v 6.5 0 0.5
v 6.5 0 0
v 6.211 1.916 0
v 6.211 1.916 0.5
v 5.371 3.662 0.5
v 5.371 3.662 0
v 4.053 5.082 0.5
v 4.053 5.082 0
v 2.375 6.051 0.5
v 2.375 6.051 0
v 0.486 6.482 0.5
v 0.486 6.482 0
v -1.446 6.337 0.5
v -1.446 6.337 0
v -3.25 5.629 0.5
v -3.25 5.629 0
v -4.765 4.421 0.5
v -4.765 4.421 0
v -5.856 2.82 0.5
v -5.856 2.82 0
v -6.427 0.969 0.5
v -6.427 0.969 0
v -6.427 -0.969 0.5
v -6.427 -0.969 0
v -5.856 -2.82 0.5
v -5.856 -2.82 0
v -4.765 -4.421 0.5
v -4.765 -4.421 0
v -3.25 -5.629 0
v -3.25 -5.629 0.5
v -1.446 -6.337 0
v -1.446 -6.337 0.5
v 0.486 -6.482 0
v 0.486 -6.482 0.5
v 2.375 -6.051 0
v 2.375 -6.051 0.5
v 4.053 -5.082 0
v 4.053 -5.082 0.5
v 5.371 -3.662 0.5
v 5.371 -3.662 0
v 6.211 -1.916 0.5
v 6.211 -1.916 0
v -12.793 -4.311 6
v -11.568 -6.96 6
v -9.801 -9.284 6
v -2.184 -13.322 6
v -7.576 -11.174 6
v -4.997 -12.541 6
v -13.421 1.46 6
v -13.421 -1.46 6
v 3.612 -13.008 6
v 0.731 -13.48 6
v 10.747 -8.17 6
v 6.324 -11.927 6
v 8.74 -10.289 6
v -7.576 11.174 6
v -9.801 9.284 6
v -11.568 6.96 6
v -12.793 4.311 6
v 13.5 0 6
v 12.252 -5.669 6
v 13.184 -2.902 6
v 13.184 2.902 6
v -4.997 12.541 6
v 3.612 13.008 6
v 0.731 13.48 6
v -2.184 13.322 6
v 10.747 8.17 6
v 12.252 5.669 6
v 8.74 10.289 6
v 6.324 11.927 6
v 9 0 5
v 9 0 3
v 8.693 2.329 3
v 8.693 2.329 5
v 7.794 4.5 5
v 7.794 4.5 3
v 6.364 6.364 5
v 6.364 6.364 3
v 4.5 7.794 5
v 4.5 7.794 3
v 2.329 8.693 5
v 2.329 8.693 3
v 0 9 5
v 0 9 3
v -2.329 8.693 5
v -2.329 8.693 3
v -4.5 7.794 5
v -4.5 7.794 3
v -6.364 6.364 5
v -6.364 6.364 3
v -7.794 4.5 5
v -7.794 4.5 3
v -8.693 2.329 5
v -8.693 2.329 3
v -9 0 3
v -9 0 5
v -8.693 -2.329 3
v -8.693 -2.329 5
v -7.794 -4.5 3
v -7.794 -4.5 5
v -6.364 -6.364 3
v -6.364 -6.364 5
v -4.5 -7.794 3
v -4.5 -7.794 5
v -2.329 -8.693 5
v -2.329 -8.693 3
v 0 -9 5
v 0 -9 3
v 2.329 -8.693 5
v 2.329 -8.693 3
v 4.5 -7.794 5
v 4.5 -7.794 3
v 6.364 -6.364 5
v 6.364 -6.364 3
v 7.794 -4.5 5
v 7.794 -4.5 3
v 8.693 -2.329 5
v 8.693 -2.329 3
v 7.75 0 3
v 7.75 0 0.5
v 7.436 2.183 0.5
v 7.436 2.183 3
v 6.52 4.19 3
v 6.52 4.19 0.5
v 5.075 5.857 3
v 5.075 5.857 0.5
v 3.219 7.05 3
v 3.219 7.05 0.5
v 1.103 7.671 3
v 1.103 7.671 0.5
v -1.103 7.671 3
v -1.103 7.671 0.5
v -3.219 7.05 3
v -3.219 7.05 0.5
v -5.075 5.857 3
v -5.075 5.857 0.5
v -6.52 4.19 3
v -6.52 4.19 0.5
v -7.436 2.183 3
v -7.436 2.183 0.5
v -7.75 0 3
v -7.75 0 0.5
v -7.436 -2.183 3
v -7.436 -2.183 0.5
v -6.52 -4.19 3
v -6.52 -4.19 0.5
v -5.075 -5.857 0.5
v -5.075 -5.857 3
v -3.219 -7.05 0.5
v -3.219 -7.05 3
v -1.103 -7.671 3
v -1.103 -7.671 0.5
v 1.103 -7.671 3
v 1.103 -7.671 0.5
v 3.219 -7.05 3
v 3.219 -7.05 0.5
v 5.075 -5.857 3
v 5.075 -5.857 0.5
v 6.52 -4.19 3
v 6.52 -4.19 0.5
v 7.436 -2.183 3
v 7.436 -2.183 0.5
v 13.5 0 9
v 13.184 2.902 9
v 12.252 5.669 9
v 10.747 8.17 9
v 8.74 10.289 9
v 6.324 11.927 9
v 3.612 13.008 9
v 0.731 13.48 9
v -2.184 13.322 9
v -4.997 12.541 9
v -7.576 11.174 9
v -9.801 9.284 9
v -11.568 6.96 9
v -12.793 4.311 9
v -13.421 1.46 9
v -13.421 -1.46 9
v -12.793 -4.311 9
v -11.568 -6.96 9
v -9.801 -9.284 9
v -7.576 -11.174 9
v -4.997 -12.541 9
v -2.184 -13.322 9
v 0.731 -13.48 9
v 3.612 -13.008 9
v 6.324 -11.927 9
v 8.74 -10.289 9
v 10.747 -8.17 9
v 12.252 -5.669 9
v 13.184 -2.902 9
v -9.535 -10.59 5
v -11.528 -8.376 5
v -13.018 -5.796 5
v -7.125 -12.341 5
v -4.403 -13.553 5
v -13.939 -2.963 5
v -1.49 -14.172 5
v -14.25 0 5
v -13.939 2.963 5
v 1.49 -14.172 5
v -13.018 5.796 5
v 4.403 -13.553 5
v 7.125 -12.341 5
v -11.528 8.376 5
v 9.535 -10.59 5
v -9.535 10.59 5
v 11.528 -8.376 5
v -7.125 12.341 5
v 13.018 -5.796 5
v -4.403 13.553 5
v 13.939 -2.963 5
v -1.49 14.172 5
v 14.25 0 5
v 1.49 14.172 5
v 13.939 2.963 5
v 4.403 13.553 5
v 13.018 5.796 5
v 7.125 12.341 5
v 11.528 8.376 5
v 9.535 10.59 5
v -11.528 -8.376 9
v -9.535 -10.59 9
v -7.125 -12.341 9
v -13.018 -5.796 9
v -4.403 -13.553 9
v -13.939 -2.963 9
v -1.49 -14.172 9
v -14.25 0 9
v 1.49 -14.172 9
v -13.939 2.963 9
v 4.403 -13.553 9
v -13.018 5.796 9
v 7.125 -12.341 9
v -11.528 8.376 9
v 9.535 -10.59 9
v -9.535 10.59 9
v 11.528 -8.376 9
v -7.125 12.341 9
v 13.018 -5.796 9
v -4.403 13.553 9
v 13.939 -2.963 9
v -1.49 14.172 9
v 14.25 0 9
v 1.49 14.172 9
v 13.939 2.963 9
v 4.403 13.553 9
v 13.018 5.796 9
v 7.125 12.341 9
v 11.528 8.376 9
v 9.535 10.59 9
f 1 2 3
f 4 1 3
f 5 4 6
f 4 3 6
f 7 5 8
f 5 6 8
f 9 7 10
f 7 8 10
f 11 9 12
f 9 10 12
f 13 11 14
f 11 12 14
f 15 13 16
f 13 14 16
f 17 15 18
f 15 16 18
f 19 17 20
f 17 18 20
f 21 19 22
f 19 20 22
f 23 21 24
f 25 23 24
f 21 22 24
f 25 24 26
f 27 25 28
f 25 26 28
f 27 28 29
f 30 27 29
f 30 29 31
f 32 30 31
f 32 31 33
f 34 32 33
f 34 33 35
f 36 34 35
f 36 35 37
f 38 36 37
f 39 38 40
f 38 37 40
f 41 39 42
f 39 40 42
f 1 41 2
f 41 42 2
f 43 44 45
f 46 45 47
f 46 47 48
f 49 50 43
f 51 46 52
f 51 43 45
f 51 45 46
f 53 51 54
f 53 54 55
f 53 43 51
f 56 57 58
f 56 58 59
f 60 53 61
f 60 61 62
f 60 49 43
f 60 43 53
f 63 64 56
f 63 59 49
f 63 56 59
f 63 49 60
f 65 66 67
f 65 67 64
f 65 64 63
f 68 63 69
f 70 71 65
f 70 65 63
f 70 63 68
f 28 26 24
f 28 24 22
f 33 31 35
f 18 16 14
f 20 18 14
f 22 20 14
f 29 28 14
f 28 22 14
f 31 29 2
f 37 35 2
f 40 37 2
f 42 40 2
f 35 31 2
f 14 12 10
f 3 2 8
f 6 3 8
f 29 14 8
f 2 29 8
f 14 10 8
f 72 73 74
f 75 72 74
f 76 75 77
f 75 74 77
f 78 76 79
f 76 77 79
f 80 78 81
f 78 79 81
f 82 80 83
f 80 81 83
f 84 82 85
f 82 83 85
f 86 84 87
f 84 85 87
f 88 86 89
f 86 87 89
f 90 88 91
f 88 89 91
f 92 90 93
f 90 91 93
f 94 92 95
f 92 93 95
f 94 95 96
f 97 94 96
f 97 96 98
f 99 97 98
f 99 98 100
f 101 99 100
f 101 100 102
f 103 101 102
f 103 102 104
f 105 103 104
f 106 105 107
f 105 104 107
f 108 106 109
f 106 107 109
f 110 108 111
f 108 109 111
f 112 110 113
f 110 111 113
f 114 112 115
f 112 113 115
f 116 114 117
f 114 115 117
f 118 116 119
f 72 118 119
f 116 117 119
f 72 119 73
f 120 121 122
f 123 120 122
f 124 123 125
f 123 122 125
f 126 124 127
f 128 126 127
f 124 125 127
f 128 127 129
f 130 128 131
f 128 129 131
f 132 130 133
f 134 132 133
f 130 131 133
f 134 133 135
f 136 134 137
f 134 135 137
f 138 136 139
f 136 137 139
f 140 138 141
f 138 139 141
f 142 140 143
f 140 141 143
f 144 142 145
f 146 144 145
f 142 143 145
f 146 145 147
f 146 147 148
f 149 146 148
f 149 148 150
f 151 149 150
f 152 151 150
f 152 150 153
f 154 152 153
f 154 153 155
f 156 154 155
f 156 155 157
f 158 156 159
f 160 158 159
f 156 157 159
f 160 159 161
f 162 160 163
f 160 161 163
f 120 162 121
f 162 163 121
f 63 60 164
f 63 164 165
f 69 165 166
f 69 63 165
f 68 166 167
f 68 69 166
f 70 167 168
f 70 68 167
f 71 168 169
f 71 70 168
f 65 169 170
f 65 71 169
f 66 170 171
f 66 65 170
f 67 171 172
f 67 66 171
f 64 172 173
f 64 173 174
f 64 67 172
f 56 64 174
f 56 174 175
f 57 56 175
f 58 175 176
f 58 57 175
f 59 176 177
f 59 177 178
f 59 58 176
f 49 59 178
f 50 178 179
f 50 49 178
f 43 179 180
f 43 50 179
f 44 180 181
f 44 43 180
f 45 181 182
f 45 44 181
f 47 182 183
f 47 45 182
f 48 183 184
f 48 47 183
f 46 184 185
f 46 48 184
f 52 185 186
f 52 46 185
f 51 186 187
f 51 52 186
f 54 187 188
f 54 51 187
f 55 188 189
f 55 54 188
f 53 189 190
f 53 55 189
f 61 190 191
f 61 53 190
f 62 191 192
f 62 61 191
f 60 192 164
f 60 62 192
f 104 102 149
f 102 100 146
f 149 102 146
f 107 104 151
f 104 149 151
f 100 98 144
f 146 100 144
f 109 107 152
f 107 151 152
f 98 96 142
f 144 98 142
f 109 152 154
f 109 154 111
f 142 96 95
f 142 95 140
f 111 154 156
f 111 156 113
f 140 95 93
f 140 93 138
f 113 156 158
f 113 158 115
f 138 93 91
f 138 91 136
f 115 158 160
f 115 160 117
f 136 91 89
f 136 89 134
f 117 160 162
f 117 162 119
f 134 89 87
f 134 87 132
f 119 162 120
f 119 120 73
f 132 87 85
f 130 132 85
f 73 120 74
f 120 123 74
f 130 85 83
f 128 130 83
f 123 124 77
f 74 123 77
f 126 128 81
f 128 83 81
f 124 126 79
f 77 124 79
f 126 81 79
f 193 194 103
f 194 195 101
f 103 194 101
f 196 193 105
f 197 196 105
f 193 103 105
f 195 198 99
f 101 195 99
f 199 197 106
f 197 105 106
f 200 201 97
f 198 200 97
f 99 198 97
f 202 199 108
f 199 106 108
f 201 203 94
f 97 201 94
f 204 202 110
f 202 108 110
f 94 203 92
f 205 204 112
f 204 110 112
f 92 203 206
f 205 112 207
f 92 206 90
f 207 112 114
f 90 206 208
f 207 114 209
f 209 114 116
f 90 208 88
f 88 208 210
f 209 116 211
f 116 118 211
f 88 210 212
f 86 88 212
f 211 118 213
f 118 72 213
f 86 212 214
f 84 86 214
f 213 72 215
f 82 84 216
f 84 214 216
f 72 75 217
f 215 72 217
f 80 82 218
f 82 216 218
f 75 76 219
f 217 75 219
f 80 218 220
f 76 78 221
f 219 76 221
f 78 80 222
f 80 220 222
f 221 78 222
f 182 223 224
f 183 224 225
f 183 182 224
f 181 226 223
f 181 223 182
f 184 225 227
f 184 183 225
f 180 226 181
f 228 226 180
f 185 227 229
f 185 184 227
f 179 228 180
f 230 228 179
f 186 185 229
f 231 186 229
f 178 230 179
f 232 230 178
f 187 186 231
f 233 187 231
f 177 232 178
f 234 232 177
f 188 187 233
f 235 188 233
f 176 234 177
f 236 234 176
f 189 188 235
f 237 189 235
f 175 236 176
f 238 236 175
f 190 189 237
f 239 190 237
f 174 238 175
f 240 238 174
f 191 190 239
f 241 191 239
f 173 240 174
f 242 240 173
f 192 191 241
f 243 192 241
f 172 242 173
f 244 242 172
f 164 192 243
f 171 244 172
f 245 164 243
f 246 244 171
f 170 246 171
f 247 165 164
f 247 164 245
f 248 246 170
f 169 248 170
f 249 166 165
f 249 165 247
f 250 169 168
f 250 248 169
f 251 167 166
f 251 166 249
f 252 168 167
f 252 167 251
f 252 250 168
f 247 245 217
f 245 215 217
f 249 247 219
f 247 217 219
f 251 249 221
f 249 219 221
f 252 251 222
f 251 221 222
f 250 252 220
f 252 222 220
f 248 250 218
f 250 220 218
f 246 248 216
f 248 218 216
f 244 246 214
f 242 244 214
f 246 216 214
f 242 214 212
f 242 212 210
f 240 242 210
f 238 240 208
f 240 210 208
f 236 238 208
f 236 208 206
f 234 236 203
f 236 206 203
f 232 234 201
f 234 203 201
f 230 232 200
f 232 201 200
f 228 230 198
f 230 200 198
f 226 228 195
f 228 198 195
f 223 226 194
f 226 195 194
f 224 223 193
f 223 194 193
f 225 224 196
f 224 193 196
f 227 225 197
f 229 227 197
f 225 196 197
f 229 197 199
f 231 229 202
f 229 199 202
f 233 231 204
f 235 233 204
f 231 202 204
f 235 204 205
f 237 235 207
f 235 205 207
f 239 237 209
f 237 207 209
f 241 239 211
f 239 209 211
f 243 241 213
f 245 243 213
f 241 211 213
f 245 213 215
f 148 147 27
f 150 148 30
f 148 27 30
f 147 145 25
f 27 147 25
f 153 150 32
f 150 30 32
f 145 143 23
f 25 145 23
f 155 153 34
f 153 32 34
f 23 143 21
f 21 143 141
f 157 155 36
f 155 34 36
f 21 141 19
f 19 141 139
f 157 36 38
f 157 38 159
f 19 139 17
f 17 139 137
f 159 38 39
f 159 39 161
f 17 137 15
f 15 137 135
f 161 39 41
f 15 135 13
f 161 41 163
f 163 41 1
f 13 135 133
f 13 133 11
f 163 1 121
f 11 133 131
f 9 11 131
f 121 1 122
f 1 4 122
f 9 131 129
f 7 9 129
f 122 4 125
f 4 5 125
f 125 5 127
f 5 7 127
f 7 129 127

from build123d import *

# Parameters (mm, degrees)
SKETCH_1_R      = 6.5
EXTRUDE_1_DEPTH = 0.5
SKETCH_2_R      = 7.75
EXTRUDE_2_DEPTH = 2.5
SKETCH_3_R      = 9
EXTRUDE_3_DEPTH = 2
SKETCH_4_R      = 14.25
EXTRUDE_4_DEPTH = 1
SKETCH_5_R      = 14.25
SKETCH_5_R_2    = 13.5
EXTRUDE_5_DEPTH = 3


with BuildPart() as part:
    # Эскиз1 → Бобышка-Вытянуть1 (new body)
    with BuildSketch(Plane.XY):
        Circle(SKETCH_1_R)
    extrude(amount=EXTRUDE_1_DEPTH)

    # Эскиз2 → Бобышка-Вытянуть2 (add)
    with BuildSketch(Plane.XY.offset(0.5)):
        Circle(SKETCH_2_R)
    extrude(amount=EXTRUDE_2_DEPTH)

    # Эскиз3 → Бобышка-Вытянуть3 (add)
    with BuildSketch(Plane.XY.offset(3)):
        Circle(SKETCH_3_R)
    extrude(amount=EXTRUDE_3_DEPTH)

    # Эскиз4 → Бобышка-Вытянуть4 (add)
    with BuildSketch(Plane.XY.offset(5)):
        Circle(SKETCH_4_R)
    extrude(amount=EXTRUDE_4_DEPTH)

    # Эскиз5 → Бобышка-Вытянуть5 (add)
    with BuildSketch(Plane.XY.offset(6)):
        Circle(SKETCH_5_R)
        Circle(SKETCH_5_R_2, mode=Mode.SUBTRACT)
    extrude(amount=EXTRUDE_5_DEPTH)


solid = part.part
